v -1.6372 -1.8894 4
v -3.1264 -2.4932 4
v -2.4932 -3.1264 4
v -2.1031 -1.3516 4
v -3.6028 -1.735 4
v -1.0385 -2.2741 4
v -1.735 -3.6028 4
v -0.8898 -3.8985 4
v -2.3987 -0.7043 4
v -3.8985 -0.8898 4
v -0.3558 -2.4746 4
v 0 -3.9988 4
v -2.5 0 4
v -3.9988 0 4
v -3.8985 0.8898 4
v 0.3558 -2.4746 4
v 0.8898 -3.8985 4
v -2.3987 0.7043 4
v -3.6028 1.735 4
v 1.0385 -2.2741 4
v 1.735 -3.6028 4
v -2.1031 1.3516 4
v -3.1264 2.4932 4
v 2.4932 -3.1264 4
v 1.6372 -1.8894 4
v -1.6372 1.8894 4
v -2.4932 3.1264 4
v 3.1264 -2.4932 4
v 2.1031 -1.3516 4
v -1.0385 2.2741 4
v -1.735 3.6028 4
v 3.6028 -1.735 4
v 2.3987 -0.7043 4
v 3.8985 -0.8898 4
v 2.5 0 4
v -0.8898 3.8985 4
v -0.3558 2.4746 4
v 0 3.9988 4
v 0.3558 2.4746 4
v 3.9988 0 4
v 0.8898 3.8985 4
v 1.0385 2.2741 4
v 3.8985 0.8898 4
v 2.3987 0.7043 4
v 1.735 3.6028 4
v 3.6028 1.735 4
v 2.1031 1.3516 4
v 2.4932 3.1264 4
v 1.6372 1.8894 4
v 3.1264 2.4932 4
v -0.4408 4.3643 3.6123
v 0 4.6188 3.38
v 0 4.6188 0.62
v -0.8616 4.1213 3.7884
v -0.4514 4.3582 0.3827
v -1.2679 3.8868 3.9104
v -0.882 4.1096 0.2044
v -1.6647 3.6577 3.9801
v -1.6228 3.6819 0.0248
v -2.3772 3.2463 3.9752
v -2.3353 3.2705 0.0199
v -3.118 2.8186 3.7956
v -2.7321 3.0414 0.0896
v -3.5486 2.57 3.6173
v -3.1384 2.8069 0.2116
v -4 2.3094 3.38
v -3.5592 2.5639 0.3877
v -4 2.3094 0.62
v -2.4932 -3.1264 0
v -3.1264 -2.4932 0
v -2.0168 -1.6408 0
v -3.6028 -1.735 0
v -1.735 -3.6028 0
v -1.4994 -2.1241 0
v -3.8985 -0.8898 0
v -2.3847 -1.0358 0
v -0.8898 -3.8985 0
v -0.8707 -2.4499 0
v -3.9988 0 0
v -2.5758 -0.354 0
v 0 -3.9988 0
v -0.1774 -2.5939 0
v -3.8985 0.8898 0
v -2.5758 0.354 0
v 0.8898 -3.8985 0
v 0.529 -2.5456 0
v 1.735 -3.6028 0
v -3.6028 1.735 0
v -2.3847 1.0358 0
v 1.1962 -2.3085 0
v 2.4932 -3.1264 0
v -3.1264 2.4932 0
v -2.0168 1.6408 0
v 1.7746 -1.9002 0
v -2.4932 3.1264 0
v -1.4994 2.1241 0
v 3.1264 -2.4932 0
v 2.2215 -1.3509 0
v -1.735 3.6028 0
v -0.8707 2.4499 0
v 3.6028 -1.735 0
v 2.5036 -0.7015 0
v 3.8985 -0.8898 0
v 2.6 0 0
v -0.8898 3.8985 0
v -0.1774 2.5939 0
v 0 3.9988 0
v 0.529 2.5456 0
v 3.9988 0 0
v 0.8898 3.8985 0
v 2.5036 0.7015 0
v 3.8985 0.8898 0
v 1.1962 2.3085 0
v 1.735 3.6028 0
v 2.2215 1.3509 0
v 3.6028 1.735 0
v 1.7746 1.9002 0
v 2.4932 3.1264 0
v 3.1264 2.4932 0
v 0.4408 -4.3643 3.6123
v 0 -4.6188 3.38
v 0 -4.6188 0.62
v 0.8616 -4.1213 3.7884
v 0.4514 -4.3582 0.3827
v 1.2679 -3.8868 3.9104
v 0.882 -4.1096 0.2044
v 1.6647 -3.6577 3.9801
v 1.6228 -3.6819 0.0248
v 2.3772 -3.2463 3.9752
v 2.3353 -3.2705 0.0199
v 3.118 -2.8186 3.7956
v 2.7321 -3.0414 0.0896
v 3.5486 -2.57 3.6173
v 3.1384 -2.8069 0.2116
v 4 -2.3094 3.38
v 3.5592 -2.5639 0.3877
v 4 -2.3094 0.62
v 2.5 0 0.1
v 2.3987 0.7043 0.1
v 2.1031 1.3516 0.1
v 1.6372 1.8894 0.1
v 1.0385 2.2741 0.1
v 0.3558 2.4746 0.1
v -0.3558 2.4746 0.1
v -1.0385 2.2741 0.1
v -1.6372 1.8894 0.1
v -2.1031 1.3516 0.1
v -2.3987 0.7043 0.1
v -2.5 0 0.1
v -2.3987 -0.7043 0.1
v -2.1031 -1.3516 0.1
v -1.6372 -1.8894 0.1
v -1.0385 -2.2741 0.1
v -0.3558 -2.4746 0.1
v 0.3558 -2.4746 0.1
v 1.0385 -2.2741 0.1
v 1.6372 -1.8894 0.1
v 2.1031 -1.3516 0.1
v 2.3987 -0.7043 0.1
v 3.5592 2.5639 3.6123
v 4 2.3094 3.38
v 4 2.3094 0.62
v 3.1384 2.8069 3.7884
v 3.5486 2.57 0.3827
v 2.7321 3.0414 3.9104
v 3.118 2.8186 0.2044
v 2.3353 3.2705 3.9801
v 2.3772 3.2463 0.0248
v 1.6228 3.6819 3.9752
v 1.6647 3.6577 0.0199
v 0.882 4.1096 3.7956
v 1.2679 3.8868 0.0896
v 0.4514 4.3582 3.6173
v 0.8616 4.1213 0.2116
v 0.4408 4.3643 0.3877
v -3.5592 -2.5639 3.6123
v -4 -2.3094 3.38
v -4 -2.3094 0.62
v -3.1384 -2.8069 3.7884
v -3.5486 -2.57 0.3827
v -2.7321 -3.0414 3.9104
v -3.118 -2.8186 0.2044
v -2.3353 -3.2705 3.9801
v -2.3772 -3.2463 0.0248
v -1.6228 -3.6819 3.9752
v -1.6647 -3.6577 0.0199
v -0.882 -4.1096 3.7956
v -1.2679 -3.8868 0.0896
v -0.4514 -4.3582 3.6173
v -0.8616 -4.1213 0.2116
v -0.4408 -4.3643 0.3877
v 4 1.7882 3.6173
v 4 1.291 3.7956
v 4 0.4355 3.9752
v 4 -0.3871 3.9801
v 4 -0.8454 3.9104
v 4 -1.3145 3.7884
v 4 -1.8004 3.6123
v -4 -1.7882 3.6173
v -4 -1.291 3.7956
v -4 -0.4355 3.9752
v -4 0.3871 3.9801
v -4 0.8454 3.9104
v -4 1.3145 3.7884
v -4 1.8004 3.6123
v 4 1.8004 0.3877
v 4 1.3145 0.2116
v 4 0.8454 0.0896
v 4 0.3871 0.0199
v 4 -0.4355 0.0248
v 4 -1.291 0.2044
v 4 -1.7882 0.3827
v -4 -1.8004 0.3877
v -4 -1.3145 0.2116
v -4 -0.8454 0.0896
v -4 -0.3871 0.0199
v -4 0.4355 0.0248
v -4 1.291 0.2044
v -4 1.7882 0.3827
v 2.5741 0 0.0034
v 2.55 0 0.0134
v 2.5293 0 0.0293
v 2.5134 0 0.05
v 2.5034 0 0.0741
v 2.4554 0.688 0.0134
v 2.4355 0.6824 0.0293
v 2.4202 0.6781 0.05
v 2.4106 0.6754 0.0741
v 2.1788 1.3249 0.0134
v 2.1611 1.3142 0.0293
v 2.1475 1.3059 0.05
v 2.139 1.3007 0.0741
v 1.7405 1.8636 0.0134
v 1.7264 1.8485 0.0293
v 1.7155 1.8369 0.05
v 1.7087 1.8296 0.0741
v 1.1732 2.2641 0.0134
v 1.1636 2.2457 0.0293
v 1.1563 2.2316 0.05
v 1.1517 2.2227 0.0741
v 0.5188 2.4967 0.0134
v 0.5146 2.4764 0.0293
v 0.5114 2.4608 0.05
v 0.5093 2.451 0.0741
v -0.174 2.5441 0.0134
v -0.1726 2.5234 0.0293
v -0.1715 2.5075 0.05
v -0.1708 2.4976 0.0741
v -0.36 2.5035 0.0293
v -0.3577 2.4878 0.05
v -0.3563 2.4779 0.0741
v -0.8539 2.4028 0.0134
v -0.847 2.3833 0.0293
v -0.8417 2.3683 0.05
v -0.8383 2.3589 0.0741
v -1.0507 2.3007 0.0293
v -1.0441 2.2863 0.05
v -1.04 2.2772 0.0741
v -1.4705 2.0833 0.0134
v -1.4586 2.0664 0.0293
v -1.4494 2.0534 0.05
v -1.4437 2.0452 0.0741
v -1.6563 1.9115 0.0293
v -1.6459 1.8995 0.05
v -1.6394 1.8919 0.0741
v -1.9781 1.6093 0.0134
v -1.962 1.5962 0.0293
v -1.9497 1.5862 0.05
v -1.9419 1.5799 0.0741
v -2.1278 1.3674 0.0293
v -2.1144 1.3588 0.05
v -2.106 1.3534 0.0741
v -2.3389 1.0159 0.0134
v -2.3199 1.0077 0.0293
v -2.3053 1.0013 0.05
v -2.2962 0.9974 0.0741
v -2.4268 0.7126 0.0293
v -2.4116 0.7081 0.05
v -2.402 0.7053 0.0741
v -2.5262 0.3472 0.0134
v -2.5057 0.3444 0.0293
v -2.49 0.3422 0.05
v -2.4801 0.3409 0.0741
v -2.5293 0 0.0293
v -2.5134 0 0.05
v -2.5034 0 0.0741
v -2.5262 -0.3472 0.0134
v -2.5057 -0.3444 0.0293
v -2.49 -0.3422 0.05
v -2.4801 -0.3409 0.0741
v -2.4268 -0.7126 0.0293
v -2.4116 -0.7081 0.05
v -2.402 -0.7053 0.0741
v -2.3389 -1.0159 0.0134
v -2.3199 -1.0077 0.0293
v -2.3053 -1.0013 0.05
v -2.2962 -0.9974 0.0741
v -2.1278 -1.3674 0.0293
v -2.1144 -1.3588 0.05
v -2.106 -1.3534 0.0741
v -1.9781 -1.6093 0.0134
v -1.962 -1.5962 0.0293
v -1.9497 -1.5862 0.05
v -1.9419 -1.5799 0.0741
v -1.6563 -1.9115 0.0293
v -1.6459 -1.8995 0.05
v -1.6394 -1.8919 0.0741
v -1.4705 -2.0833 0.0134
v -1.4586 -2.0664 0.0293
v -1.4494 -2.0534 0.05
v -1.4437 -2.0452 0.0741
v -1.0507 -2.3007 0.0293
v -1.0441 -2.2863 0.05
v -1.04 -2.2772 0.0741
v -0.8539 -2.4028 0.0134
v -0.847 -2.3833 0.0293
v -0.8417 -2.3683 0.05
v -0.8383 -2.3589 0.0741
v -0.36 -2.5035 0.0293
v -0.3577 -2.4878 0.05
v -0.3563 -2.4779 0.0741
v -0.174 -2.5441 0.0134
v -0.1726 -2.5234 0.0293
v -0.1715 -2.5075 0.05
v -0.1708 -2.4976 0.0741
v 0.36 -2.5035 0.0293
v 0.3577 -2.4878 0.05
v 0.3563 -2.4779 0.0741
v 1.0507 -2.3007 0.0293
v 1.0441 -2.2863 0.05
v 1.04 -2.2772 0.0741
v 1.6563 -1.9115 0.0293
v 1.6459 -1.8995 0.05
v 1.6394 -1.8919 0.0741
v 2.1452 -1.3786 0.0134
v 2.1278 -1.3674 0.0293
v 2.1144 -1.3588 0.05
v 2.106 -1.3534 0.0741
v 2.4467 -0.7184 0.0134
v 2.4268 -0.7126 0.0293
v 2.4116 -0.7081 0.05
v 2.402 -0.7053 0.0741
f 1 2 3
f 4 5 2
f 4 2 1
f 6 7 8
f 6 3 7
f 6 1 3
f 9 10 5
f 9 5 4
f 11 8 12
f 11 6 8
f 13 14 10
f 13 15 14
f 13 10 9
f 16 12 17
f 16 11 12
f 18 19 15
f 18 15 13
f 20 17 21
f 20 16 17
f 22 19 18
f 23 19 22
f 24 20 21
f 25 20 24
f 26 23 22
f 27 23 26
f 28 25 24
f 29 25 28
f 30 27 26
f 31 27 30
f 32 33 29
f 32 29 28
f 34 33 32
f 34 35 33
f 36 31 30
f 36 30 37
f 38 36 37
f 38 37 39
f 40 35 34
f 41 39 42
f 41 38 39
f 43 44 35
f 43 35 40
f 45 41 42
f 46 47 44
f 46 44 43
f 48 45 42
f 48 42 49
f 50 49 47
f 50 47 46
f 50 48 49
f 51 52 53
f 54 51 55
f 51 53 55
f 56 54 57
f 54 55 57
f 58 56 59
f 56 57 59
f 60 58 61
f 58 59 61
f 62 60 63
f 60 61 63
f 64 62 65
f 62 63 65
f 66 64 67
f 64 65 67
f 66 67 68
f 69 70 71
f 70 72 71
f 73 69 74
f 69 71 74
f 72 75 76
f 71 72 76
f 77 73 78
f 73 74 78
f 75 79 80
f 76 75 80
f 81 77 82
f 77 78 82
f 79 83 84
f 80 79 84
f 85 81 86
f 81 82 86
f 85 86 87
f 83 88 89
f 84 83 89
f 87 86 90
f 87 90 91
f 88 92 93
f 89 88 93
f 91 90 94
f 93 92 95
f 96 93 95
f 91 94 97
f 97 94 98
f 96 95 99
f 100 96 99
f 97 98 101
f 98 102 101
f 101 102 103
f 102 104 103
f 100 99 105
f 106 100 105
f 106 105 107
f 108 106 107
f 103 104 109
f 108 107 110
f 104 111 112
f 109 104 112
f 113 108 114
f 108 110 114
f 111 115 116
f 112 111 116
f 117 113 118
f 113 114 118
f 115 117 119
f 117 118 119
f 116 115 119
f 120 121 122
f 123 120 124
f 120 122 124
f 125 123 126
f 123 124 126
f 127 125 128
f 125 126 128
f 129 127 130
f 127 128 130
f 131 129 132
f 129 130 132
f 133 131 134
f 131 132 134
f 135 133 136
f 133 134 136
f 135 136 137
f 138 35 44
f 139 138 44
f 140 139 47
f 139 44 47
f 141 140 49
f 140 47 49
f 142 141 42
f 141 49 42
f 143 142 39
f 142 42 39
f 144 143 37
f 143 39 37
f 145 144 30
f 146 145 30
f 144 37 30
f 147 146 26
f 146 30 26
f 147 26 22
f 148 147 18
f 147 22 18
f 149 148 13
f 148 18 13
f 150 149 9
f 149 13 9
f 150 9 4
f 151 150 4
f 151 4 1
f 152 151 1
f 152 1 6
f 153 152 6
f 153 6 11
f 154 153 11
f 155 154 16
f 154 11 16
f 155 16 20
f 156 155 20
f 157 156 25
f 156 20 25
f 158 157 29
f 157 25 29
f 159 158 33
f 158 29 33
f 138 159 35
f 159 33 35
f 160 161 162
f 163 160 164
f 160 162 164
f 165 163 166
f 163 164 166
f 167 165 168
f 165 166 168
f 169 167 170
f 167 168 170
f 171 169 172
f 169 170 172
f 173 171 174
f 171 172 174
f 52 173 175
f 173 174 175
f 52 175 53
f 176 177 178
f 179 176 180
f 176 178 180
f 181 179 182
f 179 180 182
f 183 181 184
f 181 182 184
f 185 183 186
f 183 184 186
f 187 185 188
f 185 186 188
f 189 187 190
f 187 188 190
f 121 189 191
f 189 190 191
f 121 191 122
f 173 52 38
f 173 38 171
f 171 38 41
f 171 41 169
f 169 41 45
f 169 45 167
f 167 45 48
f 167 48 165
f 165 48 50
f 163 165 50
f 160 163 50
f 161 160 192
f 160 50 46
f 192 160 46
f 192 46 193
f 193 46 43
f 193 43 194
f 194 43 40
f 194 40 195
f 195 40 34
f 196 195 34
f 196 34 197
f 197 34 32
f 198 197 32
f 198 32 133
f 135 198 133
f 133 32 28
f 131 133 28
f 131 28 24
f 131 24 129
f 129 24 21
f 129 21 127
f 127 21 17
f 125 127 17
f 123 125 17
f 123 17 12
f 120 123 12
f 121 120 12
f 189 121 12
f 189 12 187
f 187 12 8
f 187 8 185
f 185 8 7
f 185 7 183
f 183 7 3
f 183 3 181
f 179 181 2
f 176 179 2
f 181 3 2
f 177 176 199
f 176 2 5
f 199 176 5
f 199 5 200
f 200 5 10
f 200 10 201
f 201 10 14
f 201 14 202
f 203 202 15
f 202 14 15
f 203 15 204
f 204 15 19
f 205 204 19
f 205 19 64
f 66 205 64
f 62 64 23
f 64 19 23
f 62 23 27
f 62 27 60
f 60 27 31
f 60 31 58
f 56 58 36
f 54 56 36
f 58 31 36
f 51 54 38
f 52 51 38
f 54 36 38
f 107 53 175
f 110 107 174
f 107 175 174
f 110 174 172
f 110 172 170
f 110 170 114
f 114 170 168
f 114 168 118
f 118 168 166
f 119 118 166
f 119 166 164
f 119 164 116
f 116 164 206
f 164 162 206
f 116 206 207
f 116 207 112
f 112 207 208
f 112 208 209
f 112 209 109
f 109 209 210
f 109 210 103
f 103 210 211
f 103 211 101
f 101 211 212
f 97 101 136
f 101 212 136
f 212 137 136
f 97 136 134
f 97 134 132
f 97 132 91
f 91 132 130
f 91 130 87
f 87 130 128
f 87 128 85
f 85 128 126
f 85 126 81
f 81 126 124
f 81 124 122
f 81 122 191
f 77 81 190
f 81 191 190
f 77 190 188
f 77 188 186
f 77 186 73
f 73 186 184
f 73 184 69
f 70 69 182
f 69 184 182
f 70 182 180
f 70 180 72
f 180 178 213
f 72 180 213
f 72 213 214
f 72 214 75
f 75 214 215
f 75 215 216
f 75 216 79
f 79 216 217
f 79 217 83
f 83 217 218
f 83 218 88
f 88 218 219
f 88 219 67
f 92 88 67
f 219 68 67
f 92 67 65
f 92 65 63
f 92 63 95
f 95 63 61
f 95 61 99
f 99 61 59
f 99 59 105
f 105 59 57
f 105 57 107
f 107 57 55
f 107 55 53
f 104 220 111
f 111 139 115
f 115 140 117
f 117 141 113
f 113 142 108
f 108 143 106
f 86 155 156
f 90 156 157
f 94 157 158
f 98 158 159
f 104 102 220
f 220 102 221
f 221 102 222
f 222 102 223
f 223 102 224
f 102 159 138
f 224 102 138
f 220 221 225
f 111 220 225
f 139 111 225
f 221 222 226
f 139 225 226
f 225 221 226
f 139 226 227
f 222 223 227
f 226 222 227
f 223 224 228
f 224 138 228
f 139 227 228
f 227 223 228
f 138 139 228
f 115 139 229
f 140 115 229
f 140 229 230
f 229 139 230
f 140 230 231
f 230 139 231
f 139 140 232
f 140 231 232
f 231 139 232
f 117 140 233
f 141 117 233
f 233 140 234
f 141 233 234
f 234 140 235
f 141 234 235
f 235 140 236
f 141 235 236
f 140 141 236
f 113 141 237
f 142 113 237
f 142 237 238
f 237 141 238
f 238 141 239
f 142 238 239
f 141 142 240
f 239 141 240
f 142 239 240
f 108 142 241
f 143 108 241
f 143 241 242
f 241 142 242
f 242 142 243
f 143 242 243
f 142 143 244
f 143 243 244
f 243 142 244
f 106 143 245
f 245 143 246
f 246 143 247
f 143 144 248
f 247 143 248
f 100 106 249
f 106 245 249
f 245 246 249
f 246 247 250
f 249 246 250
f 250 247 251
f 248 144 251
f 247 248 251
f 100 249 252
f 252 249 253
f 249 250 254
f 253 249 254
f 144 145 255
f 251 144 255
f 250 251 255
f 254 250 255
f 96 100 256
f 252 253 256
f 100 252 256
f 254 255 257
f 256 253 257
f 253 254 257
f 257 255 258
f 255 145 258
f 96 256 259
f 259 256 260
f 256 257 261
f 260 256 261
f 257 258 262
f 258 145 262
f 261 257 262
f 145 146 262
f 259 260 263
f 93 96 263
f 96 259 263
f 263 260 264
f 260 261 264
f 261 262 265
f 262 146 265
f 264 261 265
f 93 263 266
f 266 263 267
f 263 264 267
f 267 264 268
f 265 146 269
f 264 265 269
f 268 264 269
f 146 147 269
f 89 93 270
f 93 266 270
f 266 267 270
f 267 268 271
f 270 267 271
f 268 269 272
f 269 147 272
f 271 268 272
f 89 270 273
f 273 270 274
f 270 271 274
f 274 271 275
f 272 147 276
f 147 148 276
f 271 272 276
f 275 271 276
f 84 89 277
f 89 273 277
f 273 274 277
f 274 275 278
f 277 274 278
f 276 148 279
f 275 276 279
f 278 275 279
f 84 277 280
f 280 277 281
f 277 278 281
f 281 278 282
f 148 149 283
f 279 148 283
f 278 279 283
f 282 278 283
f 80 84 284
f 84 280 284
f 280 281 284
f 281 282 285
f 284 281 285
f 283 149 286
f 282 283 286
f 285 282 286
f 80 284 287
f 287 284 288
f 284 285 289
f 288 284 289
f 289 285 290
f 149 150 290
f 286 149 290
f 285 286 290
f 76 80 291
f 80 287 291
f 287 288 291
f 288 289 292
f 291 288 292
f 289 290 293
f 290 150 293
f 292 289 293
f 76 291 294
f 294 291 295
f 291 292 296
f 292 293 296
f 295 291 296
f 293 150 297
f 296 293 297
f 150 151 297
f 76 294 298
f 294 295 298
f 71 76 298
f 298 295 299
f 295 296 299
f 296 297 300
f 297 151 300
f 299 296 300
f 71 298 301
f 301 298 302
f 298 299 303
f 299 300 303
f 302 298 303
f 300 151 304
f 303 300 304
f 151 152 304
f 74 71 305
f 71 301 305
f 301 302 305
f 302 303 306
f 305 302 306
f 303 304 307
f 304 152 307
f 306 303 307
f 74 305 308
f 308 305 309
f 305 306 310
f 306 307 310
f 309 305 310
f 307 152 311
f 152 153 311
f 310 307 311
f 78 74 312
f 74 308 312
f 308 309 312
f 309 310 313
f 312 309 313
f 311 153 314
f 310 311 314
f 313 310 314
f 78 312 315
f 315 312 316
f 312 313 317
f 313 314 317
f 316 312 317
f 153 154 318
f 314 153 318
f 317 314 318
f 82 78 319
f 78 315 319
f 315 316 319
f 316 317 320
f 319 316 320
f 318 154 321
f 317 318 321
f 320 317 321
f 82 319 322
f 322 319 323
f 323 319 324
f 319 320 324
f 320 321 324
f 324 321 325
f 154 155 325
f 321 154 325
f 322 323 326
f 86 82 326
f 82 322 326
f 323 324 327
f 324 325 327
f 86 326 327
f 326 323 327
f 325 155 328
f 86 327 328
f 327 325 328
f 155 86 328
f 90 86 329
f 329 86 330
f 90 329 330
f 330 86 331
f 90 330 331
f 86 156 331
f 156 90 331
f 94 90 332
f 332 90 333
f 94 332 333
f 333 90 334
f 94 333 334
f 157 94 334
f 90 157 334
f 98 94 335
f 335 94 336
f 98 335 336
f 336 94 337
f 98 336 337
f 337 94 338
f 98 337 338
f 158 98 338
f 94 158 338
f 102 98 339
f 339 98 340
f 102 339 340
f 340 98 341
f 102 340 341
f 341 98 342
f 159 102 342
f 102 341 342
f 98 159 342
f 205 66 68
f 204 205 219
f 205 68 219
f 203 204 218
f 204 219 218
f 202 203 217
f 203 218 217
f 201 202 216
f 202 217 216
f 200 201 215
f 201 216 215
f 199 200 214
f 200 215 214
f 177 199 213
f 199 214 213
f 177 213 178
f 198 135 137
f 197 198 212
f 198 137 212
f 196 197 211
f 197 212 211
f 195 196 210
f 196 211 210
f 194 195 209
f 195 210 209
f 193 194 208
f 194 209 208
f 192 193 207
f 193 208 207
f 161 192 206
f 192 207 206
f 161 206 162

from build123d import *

# Parameters (mm, degrees)
EXTRUDE_1_DEPTH     = 4
SKETCH_2_R          = 2.5
CUT_EXTRUDE_1_DEPTH = 4
FILLET_1_R          = 0.1


with BuildPart() as part:
    # 草图1 → 凸台-拉伸1 (new body)
    with BuildSketch(Plane.XY):
        Polygon((0, 4.618802154), (-4, 2.309401077), (-4, -2.309401077), (0, -4.618802154), (4, -2.309401077), (4, 2.309401077), align=None)
    extrude(amount=EXTRUDE_1_DEPTH)

    # 草图2 → 切除-拉伸1 (cut)
    with BuildSketch(Plane.XY.offset(4)):
        Circle(SKETCH_2_R)
    extrude(amount=-CUT_EXTRUDE_1_DEPTH, mode=Mode.SUBTRACT)

    # 圆角1
    fillet_1_edges = [part.edges().sort_by_distance(p)[0] for p in [
        (-2.5, 0, 0),
    ]]
    fillet(fillet_1_edges, radius=FILLET_1_R)

    # 草图3 → 切除-旋转2 (revolve, cut)
    with BuildSketch(Plane(origin=(0, 0, 0), x_dir=(0, 0, -1), z_dir=(1, 0, 0))):
        Polygon((0, 4.618802154), (0, 3.998802154), (-0.62, 4.618802154), align=None)
        Polygon((-3.38, 4.618802154), (-4, 3.998802154), (-4, 4.618802154), align=None)
    revolve(axis=Axis((0, 0, 0), (0, 0, -1)), mode=Mode.SUBTRACT)


solid = part.part
